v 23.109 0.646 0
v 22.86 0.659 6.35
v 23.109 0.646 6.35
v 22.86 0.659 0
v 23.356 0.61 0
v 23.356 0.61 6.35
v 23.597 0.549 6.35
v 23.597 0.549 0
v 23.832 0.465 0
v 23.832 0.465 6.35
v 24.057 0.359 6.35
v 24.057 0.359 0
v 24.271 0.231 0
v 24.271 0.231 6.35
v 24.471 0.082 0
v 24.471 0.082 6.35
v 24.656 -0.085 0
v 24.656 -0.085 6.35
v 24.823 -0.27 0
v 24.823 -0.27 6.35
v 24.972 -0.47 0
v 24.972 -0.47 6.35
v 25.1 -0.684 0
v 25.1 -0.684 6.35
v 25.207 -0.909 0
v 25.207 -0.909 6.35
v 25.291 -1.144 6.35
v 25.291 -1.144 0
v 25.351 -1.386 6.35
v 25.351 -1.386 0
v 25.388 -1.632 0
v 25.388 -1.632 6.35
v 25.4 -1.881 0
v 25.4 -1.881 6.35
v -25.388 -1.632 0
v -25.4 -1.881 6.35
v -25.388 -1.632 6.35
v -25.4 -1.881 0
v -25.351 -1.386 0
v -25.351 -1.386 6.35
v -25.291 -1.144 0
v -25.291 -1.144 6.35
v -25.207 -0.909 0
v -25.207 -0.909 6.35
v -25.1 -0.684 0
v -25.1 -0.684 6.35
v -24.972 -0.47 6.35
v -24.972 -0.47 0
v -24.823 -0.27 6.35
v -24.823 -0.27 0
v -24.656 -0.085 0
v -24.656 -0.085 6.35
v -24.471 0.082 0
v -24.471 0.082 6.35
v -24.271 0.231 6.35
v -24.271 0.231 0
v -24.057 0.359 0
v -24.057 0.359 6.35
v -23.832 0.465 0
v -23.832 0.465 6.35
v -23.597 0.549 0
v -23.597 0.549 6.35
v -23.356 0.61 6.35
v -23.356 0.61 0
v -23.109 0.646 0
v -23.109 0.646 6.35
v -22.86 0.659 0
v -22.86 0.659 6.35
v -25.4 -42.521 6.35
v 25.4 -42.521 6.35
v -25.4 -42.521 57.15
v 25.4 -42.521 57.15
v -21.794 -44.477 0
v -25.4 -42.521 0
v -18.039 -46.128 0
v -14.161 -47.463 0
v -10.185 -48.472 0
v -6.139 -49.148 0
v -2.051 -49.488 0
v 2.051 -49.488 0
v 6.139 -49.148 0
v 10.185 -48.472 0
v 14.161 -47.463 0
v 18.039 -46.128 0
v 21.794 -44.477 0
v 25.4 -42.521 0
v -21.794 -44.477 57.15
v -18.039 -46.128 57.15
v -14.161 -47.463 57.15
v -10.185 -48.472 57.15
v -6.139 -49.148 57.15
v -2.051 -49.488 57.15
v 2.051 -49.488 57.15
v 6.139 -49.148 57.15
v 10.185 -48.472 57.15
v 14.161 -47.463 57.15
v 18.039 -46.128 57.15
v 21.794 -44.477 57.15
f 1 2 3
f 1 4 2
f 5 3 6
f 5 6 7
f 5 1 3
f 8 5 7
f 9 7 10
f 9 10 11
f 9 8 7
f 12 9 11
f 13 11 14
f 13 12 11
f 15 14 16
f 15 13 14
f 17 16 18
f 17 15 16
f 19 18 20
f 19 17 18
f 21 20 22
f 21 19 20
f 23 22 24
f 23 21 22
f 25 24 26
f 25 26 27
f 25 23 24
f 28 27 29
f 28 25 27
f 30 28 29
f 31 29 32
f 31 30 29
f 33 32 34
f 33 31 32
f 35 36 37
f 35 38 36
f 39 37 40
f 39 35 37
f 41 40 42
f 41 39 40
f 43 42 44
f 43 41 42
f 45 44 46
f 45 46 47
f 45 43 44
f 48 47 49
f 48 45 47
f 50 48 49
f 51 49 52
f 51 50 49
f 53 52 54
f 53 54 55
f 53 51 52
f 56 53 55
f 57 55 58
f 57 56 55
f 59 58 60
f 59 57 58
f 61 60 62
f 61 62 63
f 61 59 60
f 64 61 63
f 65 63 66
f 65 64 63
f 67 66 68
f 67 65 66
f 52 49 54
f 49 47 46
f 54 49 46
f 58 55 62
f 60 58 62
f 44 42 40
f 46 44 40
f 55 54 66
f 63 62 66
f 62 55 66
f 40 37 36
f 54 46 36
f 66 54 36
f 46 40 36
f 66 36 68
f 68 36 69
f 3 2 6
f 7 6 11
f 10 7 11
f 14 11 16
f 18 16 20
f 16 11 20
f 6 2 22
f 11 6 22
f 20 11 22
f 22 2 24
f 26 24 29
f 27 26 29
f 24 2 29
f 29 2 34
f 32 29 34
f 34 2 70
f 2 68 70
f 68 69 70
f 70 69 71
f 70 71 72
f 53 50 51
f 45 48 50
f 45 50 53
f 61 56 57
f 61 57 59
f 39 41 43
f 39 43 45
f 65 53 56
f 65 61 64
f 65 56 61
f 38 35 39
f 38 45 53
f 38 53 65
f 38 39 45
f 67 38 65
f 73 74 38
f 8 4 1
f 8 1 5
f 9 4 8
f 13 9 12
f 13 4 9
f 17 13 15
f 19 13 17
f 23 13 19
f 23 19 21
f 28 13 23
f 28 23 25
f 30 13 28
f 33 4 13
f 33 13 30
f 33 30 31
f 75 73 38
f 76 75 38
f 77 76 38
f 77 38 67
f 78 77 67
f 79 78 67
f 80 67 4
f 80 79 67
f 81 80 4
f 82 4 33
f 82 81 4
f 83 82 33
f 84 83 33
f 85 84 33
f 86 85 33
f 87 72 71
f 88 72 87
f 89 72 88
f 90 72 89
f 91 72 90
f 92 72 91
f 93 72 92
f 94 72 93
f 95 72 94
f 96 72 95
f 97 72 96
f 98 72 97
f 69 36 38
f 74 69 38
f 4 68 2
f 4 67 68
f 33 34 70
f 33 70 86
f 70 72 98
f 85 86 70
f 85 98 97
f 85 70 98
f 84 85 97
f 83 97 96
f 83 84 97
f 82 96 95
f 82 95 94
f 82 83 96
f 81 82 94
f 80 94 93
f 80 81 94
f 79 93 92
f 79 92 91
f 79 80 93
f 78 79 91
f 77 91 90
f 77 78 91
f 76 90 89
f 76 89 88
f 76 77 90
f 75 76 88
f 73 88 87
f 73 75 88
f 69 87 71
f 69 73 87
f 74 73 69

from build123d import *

# Parameters (mm, degrees)
BOSS_EXTRUDE1_DEPTH = 57.15
SKETCH2_W           = 50.8
SKETCH2_H           = 6.35
BOSS_EXTRUDE2_DEPTH = 43.18
FILLET1_R           = 2.54


with BuildPart() as part:
    # Sketch1 → Boss-Extrude1 (new body)
    with BuildSketch(Plane.XY):
        with BuildLine():
            Line((-25.4, -42.521299369), (25.4, -42.521299369))
            ThreePointArc((25.4, -42.521299369), (0, -49.53), (-25.4, -42.521299369))
        make_face()
    extrude(amount=BOSS_EXTRUDE1_DEPTH)

    # Sketch2 → Boss-Extrude2 (add)
    with BuildSketch(Plane(origin=(0, -42.521299369, 0), x_dir=(1, 0, 0), z_dir=(0, 1, 0))):
        with Locations((0, -3.175)):
            Rectangle(SKETCH2_W, SKETCH2_H)
    extrude(amount=BOSS_EXTRUDE2_DEPTH)

    # Fillet1
    fillet1_edges = [part.edges().sort_by_distance(p)[0] for p in [
        (-25.4, 0.658700631, 3.175),
        (25.4, 0.658700631, 3.175),
    ]]
    fillet(fillet1_edges, radius=FILLET1_R)


solid = part.part
